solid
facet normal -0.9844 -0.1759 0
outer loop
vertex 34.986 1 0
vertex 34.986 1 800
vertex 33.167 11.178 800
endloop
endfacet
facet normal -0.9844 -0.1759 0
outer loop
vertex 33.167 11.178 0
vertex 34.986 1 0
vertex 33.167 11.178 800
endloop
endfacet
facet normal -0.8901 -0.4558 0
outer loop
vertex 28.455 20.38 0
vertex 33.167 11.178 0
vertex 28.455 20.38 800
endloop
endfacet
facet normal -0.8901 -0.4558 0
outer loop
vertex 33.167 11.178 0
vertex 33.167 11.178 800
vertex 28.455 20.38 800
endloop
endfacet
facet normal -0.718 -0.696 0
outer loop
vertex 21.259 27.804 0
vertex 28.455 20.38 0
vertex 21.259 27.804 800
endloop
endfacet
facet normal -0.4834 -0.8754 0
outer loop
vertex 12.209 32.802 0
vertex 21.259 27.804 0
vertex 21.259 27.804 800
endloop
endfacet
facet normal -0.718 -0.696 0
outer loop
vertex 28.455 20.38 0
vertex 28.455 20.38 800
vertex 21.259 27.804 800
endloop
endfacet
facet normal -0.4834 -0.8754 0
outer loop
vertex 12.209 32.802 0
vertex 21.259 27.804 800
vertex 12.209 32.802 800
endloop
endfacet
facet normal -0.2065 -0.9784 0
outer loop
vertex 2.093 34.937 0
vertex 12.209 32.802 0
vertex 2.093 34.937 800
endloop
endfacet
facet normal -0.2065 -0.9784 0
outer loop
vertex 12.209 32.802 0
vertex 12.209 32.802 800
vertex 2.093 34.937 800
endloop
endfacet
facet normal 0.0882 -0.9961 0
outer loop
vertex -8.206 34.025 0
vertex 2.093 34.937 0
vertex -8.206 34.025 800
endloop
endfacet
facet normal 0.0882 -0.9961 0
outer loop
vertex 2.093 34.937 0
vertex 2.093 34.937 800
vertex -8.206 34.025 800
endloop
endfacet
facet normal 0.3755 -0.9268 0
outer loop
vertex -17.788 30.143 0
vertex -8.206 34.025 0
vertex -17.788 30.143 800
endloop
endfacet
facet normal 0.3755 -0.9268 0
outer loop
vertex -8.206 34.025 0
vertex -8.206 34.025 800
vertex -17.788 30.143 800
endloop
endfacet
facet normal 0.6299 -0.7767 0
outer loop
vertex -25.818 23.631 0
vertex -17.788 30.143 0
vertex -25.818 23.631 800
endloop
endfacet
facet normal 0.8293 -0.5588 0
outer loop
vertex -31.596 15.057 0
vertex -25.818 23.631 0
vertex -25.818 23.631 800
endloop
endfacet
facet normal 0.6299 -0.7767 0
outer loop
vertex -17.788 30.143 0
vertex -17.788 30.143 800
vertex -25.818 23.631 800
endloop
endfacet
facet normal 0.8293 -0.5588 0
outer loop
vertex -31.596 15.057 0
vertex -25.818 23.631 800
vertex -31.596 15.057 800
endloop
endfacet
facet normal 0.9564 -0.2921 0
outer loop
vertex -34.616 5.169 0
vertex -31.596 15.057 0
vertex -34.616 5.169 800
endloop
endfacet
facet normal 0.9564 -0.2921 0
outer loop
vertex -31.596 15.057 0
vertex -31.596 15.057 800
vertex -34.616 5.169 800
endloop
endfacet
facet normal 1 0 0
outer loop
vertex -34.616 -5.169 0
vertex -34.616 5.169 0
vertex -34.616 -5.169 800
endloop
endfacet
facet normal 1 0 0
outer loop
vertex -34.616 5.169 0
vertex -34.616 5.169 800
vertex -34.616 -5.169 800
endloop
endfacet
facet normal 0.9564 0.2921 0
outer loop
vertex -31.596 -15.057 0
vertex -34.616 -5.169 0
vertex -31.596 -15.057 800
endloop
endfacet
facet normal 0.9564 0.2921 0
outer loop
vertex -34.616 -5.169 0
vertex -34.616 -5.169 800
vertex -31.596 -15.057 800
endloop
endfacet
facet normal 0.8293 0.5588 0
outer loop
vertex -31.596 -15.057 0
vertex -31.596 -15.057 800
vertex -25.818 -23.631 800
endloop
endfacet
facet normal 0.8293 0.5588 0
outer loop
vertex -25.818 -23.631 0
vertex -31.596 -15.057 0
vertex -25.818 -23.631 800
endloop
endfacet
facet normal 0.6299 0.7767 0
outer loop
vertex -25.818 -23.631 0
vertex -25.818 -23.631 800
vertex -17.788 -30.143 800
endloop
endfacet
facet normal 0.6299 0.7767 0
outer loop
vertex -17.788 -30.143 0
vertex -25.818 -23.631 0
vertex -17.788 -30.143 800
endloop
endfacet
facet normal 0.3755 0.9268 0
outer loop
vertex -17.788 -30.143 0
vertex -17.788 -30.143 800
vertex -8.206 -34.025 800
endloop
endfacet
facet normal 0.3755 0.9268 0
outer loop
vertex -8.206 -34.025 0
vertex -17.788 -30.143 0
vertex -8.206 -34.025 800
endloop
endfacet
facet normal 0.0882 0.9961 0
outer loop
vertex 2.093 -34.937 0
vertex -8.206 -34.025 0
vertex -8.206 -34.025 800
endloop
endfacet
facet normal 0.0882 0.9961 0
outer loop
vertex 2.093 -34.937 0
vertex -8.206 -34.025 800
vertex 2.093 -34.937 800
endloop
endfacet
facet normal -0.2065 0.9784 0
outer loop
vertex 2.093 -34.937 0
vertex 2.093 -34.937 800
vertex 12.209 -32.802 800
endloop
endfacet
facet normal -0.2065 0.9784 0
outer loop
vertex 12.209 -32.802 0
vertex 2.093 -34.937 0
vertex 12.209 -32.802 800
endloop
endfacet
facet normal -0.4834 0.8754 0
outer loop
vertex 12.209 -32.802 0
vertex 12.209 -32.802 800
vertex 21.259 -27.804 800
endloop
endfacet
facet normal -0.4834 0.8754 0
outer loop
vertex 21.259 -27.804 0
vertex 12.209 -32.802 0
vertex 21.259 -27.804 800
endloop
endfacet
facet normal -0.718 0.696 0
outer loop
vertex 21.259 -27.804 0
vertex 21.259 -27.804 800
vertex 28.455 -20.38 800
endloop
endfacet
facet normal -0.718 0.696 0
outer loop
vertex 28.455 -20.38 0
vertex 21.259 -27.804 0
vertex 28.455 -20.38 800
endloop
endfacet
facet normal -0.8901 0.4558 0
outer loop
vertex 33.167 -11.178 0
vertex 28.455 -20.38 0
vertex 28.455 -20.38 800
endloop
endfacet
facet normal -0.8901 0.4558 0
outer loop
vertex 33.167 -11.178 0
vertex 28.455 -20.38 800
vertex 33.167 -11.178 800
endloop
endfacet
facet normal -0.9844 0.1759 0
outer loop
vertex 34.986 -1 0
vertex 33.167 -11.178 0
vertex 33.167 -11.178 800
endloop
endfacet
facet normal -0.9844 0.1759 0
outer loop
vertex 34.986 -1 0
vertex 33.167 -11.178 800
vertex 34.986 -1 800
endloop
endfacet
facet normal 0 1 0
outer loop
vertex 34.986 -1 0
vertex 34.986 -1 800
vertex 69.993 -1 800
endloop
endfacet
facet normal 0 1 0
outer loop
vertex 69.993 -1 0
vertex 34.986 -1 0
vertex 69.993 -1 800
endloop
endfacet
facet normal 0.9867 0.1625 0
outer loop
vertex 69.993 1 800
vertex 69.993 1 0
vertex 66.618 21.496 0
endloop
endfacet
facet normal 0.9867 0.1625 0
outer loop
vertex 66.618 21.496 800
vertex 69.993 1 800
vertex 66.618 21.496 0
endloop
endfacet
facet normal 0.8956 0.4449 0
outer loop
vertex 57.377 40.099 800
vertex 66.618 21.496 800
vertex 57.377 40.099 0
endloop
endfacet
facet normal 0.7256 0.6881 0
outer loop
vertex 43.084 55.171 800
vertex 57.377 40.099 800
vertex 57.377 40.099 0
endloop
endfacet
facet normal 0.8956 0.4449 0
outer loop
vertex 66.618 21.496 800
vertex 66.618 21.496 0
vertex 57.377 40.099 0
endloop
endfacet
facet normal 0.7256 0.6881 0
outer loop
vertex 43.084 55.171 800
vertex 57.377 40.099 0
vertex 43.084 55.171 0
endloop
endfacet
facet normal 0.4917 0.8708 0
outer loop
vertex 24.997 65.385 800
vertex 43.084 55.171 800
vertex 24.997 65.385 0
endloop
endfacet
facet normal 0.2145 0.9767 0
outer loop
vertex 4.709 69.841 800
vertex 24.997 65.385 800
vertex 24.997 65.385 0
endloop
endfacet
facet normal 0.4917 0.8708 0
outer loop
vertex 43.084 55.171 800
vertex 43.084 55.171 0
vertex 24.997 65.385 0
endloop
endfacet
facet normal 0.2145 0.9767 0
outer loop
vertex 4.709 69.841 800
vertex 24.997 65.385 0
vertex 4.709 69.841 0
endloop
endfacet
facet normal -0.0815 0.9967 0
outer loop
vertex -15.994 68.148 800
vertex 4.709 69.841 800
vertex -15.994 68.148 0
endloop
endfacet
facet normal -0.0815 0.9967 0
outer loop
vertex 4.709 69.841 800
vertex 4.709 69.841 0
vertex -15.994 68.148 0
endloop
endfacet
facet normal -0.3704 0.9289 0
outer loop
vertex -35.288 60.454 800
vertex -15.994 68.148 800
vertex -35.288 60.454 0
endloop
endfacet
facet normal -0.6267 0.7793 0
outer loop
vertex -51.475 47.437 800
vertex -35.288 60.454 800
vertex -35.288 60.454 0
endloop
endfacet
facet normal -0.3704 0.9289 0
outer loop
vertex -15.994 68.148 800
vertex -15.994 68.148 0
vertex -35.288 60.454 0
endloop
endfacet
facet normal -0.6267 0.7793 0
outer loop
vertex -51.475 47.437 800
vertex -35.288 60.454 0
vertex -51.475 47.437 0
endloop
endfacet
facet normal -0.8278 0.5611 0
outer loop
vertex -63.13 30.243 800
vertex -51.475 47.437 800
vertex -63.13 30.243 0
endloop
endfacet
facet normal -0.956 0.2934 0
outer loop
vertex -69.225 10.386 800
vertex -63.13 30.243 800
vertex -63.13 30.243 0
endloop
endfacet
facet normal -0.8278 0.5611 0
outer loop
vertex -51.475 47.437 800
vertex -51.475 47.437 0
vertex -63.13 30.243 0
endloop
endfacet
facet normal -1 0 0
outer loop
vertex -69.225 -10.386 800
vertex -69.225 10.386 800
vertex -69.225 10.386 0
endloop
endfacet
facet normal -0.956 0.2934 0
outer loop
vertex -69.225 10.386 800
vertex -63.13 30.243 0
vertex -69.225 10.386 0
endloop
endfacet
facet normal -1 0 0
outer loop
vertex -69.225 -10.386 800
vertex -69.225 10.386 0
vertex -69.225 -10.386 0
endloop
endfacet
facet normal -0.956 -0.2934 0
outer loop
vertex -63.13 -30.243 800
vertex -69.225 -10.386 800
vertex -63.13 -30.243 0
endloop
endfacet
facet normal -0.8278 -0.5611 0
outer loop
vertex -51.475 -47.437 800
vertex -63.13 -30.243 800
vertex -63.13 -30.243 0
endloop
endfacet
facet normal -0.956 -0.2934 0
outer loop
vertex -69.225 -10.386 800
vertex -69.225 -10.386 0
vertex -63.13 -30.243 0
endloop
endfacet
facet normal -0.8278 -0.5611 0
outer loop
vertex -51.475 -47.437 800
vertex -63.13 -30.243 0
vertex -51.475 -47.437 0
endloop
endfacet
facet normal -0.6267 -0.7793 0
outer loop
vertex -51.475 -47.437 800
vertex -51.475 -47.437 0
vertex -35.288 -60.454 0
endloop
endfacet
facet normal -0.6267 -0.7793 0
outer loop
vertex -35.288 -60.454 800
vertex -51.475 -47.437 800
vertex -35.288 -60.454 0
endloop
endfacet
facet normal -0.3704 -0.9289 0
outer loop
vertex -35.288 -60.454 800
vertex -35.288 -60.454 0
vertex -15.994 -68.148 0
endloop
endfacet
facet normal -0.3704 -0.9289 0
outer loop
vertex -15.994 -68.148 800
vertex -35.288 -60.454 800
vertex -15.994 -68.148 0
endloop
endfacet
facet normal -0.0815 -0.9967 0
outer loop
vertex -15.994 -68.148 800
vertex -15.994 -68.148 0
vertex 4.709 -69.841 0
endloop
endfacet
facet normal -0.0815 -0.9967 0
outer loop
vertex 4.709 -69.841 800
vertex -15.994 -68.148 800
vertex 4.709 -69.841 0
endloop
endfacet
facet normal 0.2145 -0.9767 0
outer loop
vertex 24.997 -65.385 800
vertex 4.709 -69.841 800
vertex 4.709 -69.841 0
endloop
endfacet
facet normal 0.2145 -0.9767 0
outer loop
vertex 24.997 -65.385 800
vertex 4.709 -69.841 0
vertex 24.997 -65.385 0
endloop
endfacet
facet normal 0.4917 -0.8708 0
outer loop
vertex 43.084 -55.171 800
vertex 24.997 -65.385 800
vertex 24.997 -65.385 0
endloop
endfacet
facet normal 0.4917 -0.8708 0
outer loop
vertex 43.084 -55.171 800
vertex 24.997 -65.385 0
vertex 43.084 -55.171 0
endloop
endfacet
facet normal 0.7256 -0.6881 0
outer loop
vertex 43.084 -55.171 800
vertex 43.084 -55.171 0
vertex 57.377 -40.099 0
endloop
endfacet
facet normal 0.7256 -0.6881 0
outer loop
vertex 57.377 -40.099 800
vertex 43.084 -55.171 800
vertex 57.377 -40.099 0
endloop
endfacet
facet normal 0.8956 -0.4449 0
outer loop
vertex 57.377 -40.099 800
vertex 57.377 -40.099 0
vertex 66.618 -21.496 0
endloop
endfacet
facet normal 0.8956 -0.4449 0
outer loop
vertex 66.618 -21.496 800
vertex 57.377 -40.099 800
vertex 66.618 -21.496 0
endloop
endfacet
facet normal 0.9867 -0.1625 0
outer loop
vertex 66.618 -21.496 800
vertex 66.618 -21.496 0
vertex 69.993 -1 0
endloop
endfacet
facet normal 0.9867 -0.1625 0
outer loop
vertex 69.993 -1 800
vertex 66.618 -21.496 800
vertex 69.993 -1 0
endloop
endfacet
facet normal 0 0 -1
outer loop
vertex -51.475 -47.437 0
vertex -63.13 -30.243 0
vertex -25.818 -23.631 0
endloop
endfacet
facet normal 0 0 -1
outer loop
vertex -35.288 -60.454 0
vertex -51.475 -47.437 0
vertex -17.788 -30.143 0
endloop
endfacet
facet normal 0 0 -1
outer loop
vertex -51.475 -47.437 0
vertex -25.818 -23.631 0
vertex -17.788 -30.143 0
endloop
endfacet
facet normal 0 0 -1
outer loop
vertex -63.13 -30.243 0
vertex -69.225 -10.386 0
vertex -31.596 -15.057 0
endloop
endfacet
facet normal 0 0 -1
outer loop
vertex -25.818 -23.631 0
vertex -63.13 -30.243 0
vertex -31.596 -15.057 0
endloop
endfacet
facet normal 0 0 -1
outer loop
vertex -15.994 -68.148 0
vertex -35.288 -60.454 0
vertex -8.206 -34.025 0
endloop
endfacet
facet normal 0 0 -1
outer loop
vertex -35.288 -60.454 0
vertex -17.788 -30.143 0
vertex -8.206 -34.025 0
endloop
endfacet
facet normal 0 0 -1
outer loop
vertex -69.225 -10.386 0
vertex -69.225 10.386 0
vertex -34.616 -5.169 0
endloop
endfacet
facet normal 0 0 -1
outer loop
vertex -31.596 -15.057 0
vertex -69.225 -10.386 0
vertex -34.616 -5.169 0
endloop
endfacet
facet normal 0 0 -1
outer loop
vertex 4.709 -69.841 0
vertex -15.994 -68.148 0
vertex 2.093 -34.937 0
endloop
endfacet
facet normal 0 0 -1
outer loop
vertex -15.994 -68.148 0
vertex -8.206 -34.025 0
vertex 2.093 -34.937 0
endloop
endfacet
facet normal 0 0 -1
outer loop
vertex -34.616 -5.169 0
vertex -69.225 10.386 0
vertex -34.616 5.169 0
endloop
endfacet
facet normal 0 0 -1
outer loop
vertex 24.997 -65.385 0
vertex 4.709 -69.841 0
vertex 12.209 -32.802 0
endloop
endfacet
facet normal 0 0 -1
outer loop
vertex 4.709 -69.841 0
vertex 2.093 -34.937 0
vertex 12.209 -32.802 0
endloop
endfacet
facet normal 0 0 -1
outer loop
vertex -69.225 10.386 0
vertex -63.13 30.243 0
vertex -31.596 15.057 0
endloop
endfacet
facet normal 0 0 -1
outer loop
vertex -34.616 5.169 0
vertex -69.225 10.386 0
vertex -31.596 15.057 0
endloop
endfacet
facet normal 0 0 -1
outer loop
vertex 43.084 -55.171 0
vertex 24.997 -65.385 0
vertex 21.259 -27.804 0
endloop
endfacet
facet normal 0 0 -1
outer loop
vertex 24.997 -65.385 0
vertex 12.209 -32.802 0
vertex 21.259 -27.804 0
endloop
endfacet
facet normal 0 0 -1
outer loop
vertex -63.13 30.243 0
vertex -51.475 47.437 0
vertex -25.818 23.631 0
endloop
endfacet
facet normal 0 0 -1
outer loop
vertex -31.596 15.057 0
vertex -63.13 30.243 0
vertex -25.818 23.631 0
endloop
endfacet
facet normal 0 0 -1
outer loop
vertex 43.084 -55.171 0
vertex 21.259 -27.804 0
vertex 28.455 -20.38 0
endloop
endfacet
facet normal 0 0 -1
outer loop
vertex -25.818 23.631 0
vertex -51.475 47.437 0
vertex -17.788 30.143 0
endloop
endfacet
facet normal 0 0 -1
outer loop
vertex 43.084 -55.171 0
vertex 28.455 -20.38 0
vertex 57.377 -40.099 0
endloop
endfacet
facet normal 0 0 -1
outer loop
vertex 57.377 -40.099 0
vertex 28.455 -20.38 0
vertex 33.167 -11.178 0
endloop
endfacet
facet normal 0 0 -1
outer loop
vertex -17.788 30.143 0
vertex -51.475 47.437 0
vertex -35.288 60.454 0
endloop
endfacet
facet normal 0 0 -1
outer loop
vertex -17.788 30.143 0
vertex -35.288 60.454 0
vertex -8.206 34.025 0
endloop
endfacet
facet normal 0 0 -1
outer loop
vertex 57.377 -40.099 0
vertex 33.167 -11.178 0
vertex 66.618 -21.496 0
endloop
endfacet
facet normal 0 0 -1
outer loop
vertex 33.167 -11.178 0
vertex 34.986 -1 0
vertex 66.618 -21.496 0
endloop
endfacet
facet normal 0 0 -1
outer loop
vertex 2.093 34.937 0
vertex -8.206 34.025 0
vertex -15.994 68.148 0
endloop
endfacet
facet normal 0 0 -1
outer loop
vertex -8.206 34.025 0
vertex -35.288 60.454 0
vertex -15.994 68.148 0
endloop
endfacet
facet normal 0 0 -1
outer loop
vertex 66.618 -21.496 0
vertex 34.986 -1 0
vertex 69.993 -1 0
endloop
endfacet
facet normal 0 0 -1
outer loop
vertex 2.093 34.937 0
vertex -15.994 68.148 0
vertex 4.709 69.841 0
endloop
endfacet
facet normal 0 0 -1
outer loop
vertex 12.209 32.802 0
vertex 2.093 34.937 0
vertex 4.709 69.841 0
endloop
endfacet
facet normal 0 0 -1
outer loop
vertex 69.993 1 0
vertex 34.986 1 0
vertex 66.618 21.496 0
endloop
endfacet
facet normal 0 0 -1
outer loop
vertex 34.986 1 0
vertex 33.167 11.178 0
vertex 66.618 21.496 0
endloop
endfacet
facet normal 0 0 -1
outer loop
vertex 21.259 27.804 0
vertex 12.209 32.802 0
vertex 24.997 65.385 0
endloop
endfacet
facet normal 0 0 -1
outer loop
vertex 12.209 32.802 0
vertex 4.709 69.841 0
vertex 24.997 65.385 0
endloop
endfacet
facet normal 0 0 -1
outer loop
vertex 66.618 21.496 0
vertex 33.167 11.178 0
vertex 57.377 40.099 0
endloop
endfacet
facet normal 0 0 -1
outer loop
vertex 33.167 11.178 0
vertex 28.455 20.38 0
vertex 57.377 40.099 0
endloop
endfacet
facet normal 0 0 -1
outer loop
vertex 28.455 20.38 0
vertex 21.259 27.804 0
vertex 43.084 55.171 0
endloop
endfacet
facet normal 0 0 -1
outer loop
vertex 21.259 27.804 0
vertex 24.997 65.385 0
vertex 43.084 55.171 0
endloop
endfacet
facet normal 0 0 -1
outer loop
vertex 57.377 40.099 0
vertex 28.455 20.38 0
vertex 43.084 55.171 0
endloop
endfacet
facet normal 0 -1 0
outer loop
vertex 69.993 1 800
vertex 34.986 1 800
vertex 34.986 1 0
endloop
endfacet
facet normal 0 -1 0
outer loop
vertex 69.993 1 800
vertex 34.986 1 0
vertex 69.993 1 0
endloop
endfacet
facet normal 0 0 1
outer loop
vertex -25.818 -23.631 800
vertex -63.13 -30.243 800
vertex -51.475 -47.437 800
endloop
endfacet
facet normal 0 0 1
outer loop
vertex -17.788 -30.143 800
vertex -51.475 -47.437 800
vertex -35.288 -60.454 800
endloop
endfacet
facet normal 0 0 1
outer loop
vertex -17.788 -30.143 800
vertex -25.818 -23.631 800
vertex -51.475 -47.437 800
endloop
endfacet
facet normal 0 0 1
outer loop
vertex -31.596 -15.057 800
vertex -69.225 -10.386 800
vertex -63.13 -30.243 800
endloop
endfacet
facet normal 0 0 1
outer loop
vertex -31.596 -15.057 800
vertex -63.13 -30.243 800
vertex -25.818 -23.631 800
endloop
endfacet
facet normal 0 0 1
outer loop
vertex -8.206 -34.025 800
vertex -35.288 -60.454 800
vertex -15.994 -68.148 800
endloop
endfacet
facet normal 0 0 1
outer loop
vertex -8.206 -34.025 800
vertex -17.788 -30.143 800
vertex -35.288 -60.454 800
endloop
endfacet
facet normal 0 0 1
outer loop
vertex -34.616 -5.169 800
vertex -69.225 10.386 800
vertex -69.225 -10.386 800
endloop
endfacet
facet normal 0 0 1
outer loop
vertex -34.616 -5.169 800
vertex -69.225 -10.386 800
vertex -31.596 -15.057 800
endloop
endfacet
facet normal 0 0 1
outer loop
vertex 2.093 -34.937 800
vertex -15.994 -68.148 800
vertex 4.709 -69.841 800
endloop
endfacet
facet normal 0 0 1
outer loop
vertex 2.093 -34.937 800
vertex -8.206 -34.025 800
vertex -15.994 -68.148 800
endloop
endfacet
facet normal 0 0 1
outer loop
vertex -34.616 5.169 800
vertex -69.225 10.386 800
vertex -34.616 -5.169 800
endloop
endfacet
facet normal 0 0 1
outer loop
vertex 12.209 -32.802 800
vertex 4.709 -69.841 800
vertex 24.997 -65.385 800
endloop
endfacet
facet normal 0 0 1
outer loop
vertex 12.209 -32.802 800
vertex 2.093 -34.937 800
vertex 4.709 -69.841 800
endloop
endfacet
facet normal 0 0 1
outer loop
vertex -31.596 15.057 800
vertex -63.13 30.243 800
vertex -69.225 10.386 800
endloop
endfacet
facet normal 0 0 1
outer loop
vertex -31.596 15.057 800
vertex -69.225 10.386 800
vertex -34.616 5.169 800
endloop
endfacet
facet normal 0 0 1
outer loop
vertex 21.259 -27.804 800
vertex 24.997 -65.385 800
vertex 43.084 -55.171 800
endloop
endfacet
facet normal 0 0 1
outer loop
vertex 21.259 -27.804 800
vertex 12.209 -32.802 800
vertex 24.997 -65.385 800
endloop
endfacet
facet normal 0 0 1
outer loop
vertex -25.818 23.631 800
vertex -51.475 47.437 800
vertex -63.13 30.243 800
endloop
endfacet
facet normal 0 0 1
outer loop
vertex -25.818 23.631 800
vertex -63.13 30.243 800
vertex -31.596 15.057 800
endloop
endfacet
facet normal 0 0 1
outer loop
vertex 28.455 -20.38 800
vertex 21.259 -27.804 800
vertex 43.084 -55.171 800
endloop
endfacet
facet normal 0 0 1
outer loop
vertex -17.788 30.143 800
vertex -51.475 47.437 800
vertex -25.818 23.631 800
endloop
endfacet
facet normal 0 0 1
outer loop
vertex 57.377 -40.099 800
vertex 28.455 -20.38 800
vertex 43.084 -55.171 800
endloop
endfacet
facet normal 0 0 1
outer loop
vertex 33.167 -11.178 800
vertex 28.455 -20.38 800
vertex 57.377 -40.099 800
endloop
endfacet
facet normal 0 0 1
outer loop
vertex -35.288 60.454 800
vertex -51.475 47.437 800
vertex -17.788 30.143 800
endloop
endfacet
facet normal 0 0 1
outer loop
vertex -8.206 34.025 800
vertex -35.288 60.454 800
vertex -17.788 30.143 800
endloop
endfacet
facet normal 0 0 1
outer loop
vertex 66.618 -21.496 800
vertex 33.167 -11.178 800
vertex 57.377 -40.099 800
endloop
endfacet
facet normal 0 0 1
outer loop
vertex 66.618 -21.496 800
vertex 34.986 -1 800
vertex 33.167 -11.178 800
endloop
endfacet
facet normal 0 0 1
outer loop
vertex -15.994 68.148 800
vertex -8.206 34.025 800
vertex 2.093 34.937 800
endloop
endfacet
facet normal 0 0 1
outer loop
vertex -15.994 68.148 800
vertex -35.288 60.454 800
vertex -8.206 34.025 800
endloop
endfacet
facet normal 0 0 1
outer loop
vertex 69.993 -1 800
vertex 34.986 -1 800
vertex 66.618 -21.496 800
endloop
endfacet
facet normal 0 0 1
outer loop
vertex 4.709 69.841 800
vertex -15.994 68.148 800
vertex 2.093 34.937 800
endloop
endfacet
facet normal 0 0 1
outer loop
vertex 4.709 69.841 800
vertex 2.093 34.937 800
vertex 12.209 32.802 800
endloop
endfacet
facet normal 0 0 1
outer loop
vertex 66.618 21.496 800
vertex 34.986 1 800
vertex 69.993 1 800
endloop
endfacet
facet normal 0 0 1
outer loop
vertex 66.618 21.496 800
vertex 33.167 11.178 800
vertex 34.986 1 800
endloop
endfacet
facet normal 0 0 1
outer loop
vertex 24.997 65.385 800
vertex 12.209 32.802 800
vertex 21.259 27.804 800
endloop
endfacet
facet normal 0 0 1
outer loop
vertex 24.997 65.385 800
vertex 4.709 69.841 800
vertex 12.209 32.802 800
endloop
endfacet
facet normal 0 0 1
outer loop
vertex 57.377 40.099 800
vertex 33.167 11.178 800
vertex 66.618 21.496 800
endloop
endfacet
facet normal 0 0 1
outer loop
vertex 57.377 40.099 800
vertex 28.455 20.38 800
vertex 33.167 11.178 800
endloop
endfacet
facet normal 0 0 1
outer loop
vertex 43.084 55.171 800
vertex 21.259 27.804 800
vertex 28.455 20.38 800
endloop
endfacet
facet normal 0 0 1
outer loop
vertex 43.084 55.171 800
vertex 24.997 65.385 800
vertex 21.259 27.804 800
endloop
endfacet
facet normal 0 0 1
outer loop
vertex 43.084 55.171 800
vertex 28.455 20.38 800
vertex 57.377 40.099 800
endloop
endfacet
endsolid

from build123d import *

# Parameters (mm, degrees)
ESQUISSE1_R             = 70
BASE_EXTRUSION_DEPTH    = 800
ESQUISSE2_R             = 35
ENL_V_MAT_EXTRU_1_DEPTH = 800
ESQUISSE3_W             = 70
ESQUISSE3_H             = 2
ENL_V_MAT_EXTRU_2_DEPTH = 800


with BuildPart() as part:
    # Esquisse1 → Base-Extrusion (new body)
    with BuildSketch(Plane.XY):
        Circle(ESQUISSE1_R)
    extrude(amount=BASE_EXTRUSION_DEPTH)

    # Esquisse2 → Enlèv. mat.-Extru.1 (cut)
    with BuildSketch(Plane.XY.offset(800)):
        Circle(ESQUISSE2_R)
    extrude(amount=-ENL_V_MAT_EXTRU_1_DEPTH, mode=Mode.SUBTRACT)

    # Esquisse3 → Enlèv. mat.-Extru.2 (cut)
    with BuildSketch(Plane.XY.offset(800)):
        with Locations((45, 0)):
            Rectangle(ESQUISSE3_W, ESQUISSE3_H)
    extrude(amount=-ENL_V_MAT_EXTRU_2_DEPTH, mode=Mode.SUBTRACT)


solid = part.part
